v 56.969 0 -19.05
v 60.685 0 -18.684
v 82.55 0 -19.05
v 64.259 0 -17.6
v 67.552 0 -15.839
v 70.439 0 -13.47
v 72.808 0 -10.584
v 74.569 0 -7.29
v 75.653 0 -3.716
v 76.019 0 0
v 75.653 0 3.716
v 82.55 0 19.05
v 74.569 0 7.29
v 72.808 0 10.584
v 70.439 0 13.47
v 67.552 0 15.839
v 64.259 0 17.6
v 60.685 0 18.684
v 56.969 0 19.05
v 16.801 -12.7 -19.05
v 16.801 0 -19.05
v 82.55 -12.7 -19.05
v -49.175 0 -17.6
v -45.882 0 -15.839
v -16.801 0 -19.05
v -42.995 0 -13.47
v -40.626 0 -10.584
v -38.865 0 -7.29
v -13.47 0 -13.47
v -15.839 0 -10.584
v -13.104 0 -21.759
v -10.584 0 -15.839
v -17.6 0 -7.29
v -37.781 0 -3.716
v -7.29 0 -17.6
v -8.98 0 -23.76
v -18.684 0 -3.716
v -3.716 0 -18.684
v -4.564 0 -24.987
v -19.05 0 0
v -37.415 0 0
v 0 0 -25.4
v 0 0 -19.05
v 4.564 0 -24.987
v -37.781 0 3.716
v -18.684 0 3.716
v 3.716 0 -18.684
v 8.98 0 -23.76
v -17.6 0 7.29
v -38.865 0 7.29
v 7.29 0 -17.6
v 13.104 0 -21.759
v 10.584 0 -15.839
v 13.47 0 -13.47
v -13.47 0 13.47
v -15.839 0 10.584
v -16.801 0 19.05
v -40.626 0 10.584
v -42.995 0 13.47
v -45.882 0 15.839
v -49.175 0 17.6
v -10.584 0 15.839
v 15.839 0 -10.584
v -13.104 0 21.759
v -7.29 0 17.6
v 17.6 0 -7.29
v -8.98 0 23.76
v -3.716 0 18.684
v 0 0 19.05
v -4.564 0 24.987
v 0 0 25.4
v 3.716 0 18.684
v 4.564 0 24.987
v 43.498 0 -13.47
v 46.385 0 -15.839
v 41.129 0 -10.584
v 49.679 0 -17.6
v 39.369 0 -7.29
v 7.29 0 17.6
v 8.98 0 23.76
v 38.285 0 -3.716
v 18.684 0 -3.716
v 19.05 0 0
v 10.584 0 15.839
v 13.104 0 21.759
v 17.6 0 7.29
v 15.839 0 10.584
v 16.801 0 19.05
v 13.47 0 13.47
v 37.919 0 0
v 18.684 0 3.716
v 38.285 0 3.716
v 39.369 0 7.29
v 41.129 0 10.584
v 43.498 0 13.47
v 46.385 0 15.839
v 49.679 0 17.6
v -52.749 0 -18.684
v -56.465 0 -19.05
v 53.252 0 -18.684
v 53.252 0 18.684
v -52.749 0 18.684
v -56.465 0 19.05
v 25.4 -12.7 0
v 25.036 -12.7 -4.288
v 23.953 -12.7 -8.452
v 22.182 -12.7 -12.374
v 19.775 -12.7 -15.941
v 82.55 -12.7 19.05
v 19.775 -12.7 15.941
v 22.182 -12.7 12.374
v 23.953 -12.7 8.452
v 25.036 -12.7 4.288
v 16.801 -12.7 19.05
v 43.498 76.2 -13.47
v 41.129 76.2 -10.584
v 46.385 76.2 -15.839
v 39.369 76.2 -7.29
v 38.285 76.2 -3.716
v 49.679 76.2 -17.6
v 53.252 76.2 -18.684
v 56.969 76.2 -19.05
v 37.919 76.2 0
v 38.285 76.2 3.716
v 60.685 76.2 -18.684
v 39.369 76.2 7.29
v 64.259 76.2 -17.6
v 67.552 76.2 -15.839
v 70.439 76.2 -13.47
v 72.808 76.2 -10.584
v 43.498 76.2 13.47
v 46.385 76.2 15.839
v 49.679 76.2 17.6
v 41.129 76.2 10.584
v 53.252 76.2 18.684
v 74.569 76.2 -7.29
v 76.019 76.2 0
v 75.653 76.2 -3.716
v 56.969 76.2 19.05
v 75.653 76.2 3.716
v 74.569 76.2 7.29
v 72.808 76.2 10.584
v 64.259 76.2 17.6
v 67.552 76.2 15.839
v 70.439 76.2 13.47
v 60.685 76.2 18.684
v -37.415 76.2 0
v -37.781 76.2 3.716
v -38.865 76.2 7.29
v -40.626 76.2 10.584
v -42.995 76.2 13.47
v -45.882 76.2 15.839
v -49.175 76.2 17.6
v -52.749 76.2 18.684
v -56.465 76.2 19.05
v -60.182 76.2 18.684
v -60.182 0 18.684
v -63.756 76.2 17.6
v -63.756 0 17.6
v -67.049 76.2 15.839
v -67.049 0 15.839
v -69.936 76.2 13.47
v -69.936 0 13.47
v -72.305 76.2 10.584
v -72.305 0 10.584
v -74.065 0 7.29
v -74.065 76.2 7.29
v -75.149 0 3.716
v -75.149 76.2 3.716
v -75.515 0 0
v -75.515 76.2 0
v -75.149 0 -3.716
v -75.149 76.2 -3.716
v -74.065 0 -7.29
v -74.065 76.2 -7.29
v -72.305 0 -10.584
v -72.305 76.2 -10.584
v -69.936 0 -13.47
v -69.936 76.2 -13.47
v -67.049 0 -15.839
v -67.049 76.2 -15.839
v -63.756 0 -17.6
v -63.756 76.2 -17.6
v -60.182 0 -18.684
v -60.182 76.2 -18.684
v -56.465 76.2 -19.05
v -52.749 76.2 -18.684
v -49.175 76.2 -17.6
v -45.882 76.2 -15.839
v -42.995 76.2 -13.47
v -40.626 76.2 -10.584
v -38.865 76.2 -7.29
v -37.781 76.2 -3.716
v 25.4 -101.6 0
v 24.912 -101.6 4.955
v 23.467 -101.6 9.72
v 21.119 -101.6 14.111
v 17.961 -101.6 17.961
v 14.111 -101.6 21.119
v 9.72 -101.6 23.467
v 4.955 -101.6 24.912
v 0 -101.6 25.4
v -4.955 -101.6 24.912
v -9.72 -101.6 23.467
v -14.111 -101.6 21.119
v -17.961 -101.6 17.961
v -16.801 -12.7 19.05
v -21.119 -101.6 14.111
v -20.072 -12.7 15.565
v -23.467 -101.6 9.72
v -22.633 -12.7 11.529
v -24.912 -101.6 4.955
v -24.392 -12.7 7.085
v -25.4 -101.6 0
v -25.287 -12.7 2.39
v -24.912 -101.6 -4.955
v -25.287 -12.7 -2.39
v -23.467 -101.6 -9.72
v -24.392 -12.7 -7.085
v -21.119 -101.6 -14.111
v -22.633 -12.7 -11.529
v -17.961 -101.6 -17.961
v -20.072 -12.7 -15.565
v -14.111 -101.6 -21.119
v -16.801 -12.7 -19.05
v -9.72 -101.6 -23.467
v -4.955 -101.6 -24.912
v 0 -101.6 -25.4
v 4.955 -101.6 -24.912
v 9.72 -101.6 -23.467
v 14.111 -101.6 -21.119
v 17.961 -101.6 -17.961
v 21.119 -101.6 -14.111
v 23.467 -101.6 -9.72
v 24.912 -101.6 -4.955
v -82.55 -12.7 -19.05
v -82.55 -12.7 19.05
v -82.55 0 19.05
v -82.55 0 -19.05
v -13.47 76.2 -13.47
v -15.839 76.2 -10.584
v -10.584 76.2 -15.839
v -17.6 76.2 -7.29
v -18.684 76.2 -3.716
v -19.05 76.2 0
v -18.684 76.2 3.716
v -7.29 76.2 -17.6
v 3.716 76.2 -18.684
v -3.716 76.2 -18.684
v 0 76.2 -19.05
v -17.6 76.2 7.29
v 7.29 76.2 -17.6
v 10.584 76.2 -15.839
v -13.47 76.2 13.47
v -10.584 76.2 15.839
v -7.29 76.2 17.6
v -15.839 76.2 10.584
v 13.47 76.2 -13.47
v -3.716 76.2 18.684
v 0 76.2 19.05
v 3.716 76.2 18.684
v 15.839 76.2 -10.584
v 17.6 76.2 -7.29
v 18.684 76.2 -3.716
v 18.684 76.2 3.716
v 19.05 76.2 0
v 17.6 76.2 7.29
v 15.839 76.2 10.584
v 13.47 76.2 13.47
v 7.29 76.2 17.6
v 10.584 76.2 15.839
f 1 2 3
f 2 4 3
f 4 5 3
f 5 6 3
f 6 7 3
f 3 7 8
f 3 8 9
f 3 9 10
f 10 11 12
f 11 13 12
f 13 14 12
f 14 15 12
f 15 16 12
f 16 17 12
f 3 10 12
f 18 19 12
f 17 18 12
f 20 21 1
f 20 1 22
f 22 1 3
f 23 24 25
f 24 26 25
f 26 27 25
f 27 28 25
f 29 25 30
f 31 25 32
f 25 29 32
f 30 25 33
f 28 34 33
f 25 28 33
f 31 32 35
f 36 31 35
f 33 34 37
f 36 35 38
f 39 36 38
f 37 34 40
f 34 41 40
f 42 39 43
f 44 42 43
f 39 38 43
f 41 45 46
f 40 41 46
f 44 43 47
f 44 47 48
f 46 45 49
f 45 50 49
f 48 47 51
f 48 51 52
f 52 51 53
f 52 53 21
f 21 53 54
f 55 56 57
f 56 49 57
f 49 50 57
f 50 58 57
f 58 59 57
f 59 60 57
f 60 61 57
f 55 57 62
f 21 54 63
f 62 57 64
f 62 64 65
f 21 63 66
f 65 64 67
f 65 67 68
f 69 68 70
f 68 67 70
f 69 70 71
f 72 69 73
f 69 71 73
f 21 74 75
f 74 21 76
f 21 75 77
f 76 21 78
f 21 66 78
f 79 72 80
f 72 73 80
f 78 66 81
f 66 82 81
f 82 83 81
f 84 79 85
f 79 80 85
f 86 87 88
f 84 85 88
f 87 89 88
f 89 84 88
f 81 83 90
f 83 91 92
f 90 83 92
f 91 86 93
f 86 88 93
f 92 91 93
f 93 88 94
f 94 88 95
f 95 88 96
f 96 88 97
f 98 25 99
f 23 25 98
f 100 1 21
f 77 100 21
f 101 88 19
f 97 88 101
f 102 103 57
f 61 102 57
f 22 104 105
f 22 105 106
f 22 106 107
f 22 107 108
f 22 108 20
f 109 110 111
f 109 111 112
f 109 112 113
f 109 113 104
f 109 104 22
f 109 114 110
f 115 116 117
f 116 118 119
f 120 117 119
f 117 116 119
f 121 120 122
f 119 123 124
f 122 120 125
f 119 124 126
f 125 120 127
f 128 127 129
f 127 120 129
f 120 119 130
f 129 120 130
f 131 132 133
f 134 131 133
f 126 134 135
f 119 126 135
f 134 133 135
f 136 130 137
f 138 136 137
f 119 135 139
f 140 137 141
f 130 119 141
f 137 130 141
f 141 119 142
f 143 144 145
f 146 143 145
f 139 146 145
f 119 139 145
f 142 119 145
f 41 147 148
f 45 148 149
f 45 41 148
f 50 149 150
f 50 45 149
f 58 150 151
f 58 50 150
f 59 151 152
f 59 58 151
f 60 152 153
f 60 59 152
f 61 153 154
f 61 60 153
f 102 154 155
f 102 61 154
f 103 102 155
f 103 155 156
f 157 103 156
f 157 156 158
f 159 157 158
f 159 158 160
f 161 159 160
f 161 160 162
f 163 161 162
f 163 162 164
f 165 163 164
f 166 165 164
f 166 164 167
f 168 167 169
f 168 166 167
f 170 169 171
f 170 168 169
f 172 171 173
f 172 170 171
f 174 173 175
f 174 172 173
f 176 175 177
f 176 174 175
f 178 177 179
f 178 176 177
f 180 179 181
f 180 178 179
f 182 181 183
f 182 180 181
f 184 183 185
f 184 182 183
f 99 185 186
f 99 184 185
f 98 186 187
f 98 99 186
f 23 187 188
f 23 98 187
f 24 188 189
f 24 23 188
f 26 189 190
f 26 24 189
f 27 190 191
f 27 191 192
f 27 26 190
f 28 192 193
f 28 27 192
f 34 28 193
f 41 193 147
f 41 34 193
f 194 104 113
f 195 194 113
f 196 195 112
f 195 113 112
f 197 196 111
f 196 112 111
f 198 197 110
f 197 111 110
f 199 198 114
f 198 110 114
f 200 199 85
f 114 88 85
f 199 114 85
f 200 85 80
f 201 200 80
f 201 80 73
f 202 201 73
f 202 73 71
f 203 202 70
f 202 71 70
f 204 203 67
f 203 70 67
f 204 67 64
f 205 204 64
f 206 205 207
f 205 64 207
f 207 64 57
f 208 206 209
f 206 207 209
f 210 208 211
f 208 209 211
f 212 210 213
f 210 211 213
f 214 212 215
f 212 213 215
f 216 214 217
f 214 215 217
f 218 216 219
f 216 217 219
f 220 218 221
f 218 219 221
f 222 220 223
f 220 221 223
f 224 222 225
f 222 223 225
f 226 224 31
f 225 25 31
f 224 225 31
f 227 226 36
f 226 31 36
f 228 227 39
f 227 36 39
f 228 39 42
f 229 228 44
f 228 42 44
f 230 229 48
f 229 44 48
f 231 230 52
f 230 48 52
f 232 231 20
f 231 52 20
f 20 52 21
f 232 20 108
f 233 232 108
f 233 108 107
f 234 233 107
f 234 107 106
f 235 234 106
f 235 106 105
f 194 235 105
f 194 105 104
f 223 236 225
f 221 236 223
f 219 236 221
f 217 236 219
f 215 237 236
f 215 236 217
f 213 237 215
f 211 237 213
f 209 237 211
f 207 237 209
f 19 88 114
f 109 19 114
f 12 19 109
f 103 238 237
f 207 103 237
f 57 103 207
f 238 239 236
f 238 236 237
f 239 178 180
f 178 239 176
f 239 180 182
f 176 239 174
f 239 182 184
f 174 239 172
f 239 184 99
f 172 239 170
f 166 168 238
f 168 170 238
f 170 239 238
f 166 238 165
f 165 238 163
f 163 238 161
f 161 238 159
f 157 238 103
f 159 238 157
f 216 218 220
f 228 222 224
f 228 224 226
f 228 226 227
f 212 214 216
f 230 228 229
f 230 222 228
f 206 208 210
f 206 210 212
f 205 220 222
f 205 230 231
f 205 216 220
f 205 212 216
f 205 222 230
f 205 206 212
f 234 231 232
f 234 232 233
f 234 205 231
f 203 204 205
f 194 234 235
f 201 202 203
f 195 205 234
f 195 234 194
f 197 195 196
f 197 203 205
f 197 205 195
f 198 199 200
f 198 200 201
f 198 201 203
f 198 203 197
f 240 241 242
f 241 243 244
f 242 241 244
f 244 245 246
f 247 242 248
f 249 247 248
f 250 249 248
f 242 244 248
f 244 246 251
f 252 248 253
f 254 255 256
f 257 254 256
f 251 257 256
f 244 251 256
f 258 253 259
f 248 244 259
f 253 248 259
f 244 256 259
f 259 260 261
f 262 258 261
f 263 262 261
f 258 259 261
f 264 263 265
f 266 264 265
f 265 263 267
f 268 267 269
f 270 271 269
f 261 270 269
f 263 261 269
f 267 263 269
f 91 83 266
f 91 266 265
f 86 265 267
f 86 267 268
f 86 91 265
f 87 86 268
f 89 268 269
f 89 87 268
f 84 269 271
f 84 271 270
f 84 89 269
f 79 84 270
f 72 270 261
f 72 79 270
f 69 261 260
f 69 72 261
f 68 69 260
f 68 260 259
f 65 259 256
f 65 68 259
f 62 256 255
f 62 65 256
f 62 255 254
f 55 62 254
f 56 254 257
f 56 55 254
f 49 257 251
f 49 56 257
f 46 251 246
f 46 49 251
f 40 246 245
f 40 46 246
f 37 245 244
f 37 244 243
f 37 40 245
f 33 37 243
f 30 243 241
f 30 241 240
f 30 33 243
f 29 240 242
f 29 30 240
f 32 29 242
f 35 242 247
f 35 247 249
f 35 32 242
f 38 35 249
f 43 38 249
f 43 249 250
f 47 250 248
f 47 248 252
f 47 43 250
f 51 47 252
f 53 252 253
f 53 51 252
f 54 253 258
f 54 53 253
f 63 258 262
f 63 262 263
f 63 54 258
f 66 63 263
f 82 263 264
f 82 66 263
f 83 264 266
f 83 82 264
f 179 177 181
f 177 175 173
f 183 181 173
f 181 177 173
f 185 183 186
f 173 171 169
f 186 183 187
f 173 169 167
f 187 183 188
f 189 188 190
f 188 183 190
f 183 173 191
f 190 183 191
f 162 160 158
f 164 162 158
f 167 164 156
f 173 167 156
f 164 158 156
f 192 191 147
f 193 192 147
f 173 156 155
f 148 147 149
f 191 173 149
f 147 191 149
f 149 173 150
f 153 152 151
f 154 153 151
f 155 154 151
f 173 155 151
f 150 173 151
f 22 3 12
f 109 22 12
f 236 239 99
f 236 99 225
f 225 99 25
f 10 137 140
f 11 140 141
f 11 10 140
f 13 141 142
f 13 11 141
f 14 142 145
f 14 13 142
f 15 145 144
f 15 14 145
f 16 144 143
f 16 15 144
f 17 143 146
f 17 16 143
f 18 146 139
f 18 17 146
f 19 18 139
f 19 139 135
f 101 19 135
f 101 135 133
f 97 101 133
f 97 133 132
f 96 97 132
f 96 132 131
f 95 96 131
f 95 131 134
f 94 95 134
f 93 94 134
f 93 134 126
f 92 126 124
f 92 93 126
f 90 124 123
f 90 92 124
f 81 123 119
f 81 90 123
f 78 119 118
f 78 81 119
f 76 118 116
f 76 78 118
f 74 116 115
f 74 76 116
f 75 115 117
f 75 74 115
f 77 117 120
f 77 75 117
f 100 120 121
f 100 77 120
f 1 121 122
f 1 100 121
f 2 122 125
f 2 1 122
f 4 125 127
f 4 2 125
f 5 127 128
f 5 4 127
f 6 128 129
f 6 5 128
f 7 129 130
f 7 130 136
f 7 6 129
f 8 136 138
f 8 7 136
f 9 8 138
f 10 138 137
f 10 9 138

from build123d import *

# Parameters (mm, degrees)
F0_W     = 165.1
F0_H     = 38.1
F1_DEPTH = 12.7
F2_R     = 25.4
F3_DEPTH = 101.6
F4_R     = 19.05
F5_DEPTH = 76.2


with BuildPart() as f1:
    # F0 (on Front) → F1 (new body)
    with BuildSketch(Plane.XZ):
        Rectangle(F0_W, F0_H)
    extrude(amount=F1_DEPTH)

    # F2 (on Front) → F3 (join)
    with BuildSketch(Plane.XZ):
        Circle(F2_R)
    extrude(amount=F3_DEPTH)

    # F4 (on Front) → F5 (join)
    with BuildSketch(Plane.XZ):
        with Locations((56.968745, 0)):
            Circle(F4_R)
        with Locations((-56.4654, 0)):
            Circle(F4_R)
        Circle(F4_R)
    extrude(amount=-F5_DEPTH)


solid = f1.part
